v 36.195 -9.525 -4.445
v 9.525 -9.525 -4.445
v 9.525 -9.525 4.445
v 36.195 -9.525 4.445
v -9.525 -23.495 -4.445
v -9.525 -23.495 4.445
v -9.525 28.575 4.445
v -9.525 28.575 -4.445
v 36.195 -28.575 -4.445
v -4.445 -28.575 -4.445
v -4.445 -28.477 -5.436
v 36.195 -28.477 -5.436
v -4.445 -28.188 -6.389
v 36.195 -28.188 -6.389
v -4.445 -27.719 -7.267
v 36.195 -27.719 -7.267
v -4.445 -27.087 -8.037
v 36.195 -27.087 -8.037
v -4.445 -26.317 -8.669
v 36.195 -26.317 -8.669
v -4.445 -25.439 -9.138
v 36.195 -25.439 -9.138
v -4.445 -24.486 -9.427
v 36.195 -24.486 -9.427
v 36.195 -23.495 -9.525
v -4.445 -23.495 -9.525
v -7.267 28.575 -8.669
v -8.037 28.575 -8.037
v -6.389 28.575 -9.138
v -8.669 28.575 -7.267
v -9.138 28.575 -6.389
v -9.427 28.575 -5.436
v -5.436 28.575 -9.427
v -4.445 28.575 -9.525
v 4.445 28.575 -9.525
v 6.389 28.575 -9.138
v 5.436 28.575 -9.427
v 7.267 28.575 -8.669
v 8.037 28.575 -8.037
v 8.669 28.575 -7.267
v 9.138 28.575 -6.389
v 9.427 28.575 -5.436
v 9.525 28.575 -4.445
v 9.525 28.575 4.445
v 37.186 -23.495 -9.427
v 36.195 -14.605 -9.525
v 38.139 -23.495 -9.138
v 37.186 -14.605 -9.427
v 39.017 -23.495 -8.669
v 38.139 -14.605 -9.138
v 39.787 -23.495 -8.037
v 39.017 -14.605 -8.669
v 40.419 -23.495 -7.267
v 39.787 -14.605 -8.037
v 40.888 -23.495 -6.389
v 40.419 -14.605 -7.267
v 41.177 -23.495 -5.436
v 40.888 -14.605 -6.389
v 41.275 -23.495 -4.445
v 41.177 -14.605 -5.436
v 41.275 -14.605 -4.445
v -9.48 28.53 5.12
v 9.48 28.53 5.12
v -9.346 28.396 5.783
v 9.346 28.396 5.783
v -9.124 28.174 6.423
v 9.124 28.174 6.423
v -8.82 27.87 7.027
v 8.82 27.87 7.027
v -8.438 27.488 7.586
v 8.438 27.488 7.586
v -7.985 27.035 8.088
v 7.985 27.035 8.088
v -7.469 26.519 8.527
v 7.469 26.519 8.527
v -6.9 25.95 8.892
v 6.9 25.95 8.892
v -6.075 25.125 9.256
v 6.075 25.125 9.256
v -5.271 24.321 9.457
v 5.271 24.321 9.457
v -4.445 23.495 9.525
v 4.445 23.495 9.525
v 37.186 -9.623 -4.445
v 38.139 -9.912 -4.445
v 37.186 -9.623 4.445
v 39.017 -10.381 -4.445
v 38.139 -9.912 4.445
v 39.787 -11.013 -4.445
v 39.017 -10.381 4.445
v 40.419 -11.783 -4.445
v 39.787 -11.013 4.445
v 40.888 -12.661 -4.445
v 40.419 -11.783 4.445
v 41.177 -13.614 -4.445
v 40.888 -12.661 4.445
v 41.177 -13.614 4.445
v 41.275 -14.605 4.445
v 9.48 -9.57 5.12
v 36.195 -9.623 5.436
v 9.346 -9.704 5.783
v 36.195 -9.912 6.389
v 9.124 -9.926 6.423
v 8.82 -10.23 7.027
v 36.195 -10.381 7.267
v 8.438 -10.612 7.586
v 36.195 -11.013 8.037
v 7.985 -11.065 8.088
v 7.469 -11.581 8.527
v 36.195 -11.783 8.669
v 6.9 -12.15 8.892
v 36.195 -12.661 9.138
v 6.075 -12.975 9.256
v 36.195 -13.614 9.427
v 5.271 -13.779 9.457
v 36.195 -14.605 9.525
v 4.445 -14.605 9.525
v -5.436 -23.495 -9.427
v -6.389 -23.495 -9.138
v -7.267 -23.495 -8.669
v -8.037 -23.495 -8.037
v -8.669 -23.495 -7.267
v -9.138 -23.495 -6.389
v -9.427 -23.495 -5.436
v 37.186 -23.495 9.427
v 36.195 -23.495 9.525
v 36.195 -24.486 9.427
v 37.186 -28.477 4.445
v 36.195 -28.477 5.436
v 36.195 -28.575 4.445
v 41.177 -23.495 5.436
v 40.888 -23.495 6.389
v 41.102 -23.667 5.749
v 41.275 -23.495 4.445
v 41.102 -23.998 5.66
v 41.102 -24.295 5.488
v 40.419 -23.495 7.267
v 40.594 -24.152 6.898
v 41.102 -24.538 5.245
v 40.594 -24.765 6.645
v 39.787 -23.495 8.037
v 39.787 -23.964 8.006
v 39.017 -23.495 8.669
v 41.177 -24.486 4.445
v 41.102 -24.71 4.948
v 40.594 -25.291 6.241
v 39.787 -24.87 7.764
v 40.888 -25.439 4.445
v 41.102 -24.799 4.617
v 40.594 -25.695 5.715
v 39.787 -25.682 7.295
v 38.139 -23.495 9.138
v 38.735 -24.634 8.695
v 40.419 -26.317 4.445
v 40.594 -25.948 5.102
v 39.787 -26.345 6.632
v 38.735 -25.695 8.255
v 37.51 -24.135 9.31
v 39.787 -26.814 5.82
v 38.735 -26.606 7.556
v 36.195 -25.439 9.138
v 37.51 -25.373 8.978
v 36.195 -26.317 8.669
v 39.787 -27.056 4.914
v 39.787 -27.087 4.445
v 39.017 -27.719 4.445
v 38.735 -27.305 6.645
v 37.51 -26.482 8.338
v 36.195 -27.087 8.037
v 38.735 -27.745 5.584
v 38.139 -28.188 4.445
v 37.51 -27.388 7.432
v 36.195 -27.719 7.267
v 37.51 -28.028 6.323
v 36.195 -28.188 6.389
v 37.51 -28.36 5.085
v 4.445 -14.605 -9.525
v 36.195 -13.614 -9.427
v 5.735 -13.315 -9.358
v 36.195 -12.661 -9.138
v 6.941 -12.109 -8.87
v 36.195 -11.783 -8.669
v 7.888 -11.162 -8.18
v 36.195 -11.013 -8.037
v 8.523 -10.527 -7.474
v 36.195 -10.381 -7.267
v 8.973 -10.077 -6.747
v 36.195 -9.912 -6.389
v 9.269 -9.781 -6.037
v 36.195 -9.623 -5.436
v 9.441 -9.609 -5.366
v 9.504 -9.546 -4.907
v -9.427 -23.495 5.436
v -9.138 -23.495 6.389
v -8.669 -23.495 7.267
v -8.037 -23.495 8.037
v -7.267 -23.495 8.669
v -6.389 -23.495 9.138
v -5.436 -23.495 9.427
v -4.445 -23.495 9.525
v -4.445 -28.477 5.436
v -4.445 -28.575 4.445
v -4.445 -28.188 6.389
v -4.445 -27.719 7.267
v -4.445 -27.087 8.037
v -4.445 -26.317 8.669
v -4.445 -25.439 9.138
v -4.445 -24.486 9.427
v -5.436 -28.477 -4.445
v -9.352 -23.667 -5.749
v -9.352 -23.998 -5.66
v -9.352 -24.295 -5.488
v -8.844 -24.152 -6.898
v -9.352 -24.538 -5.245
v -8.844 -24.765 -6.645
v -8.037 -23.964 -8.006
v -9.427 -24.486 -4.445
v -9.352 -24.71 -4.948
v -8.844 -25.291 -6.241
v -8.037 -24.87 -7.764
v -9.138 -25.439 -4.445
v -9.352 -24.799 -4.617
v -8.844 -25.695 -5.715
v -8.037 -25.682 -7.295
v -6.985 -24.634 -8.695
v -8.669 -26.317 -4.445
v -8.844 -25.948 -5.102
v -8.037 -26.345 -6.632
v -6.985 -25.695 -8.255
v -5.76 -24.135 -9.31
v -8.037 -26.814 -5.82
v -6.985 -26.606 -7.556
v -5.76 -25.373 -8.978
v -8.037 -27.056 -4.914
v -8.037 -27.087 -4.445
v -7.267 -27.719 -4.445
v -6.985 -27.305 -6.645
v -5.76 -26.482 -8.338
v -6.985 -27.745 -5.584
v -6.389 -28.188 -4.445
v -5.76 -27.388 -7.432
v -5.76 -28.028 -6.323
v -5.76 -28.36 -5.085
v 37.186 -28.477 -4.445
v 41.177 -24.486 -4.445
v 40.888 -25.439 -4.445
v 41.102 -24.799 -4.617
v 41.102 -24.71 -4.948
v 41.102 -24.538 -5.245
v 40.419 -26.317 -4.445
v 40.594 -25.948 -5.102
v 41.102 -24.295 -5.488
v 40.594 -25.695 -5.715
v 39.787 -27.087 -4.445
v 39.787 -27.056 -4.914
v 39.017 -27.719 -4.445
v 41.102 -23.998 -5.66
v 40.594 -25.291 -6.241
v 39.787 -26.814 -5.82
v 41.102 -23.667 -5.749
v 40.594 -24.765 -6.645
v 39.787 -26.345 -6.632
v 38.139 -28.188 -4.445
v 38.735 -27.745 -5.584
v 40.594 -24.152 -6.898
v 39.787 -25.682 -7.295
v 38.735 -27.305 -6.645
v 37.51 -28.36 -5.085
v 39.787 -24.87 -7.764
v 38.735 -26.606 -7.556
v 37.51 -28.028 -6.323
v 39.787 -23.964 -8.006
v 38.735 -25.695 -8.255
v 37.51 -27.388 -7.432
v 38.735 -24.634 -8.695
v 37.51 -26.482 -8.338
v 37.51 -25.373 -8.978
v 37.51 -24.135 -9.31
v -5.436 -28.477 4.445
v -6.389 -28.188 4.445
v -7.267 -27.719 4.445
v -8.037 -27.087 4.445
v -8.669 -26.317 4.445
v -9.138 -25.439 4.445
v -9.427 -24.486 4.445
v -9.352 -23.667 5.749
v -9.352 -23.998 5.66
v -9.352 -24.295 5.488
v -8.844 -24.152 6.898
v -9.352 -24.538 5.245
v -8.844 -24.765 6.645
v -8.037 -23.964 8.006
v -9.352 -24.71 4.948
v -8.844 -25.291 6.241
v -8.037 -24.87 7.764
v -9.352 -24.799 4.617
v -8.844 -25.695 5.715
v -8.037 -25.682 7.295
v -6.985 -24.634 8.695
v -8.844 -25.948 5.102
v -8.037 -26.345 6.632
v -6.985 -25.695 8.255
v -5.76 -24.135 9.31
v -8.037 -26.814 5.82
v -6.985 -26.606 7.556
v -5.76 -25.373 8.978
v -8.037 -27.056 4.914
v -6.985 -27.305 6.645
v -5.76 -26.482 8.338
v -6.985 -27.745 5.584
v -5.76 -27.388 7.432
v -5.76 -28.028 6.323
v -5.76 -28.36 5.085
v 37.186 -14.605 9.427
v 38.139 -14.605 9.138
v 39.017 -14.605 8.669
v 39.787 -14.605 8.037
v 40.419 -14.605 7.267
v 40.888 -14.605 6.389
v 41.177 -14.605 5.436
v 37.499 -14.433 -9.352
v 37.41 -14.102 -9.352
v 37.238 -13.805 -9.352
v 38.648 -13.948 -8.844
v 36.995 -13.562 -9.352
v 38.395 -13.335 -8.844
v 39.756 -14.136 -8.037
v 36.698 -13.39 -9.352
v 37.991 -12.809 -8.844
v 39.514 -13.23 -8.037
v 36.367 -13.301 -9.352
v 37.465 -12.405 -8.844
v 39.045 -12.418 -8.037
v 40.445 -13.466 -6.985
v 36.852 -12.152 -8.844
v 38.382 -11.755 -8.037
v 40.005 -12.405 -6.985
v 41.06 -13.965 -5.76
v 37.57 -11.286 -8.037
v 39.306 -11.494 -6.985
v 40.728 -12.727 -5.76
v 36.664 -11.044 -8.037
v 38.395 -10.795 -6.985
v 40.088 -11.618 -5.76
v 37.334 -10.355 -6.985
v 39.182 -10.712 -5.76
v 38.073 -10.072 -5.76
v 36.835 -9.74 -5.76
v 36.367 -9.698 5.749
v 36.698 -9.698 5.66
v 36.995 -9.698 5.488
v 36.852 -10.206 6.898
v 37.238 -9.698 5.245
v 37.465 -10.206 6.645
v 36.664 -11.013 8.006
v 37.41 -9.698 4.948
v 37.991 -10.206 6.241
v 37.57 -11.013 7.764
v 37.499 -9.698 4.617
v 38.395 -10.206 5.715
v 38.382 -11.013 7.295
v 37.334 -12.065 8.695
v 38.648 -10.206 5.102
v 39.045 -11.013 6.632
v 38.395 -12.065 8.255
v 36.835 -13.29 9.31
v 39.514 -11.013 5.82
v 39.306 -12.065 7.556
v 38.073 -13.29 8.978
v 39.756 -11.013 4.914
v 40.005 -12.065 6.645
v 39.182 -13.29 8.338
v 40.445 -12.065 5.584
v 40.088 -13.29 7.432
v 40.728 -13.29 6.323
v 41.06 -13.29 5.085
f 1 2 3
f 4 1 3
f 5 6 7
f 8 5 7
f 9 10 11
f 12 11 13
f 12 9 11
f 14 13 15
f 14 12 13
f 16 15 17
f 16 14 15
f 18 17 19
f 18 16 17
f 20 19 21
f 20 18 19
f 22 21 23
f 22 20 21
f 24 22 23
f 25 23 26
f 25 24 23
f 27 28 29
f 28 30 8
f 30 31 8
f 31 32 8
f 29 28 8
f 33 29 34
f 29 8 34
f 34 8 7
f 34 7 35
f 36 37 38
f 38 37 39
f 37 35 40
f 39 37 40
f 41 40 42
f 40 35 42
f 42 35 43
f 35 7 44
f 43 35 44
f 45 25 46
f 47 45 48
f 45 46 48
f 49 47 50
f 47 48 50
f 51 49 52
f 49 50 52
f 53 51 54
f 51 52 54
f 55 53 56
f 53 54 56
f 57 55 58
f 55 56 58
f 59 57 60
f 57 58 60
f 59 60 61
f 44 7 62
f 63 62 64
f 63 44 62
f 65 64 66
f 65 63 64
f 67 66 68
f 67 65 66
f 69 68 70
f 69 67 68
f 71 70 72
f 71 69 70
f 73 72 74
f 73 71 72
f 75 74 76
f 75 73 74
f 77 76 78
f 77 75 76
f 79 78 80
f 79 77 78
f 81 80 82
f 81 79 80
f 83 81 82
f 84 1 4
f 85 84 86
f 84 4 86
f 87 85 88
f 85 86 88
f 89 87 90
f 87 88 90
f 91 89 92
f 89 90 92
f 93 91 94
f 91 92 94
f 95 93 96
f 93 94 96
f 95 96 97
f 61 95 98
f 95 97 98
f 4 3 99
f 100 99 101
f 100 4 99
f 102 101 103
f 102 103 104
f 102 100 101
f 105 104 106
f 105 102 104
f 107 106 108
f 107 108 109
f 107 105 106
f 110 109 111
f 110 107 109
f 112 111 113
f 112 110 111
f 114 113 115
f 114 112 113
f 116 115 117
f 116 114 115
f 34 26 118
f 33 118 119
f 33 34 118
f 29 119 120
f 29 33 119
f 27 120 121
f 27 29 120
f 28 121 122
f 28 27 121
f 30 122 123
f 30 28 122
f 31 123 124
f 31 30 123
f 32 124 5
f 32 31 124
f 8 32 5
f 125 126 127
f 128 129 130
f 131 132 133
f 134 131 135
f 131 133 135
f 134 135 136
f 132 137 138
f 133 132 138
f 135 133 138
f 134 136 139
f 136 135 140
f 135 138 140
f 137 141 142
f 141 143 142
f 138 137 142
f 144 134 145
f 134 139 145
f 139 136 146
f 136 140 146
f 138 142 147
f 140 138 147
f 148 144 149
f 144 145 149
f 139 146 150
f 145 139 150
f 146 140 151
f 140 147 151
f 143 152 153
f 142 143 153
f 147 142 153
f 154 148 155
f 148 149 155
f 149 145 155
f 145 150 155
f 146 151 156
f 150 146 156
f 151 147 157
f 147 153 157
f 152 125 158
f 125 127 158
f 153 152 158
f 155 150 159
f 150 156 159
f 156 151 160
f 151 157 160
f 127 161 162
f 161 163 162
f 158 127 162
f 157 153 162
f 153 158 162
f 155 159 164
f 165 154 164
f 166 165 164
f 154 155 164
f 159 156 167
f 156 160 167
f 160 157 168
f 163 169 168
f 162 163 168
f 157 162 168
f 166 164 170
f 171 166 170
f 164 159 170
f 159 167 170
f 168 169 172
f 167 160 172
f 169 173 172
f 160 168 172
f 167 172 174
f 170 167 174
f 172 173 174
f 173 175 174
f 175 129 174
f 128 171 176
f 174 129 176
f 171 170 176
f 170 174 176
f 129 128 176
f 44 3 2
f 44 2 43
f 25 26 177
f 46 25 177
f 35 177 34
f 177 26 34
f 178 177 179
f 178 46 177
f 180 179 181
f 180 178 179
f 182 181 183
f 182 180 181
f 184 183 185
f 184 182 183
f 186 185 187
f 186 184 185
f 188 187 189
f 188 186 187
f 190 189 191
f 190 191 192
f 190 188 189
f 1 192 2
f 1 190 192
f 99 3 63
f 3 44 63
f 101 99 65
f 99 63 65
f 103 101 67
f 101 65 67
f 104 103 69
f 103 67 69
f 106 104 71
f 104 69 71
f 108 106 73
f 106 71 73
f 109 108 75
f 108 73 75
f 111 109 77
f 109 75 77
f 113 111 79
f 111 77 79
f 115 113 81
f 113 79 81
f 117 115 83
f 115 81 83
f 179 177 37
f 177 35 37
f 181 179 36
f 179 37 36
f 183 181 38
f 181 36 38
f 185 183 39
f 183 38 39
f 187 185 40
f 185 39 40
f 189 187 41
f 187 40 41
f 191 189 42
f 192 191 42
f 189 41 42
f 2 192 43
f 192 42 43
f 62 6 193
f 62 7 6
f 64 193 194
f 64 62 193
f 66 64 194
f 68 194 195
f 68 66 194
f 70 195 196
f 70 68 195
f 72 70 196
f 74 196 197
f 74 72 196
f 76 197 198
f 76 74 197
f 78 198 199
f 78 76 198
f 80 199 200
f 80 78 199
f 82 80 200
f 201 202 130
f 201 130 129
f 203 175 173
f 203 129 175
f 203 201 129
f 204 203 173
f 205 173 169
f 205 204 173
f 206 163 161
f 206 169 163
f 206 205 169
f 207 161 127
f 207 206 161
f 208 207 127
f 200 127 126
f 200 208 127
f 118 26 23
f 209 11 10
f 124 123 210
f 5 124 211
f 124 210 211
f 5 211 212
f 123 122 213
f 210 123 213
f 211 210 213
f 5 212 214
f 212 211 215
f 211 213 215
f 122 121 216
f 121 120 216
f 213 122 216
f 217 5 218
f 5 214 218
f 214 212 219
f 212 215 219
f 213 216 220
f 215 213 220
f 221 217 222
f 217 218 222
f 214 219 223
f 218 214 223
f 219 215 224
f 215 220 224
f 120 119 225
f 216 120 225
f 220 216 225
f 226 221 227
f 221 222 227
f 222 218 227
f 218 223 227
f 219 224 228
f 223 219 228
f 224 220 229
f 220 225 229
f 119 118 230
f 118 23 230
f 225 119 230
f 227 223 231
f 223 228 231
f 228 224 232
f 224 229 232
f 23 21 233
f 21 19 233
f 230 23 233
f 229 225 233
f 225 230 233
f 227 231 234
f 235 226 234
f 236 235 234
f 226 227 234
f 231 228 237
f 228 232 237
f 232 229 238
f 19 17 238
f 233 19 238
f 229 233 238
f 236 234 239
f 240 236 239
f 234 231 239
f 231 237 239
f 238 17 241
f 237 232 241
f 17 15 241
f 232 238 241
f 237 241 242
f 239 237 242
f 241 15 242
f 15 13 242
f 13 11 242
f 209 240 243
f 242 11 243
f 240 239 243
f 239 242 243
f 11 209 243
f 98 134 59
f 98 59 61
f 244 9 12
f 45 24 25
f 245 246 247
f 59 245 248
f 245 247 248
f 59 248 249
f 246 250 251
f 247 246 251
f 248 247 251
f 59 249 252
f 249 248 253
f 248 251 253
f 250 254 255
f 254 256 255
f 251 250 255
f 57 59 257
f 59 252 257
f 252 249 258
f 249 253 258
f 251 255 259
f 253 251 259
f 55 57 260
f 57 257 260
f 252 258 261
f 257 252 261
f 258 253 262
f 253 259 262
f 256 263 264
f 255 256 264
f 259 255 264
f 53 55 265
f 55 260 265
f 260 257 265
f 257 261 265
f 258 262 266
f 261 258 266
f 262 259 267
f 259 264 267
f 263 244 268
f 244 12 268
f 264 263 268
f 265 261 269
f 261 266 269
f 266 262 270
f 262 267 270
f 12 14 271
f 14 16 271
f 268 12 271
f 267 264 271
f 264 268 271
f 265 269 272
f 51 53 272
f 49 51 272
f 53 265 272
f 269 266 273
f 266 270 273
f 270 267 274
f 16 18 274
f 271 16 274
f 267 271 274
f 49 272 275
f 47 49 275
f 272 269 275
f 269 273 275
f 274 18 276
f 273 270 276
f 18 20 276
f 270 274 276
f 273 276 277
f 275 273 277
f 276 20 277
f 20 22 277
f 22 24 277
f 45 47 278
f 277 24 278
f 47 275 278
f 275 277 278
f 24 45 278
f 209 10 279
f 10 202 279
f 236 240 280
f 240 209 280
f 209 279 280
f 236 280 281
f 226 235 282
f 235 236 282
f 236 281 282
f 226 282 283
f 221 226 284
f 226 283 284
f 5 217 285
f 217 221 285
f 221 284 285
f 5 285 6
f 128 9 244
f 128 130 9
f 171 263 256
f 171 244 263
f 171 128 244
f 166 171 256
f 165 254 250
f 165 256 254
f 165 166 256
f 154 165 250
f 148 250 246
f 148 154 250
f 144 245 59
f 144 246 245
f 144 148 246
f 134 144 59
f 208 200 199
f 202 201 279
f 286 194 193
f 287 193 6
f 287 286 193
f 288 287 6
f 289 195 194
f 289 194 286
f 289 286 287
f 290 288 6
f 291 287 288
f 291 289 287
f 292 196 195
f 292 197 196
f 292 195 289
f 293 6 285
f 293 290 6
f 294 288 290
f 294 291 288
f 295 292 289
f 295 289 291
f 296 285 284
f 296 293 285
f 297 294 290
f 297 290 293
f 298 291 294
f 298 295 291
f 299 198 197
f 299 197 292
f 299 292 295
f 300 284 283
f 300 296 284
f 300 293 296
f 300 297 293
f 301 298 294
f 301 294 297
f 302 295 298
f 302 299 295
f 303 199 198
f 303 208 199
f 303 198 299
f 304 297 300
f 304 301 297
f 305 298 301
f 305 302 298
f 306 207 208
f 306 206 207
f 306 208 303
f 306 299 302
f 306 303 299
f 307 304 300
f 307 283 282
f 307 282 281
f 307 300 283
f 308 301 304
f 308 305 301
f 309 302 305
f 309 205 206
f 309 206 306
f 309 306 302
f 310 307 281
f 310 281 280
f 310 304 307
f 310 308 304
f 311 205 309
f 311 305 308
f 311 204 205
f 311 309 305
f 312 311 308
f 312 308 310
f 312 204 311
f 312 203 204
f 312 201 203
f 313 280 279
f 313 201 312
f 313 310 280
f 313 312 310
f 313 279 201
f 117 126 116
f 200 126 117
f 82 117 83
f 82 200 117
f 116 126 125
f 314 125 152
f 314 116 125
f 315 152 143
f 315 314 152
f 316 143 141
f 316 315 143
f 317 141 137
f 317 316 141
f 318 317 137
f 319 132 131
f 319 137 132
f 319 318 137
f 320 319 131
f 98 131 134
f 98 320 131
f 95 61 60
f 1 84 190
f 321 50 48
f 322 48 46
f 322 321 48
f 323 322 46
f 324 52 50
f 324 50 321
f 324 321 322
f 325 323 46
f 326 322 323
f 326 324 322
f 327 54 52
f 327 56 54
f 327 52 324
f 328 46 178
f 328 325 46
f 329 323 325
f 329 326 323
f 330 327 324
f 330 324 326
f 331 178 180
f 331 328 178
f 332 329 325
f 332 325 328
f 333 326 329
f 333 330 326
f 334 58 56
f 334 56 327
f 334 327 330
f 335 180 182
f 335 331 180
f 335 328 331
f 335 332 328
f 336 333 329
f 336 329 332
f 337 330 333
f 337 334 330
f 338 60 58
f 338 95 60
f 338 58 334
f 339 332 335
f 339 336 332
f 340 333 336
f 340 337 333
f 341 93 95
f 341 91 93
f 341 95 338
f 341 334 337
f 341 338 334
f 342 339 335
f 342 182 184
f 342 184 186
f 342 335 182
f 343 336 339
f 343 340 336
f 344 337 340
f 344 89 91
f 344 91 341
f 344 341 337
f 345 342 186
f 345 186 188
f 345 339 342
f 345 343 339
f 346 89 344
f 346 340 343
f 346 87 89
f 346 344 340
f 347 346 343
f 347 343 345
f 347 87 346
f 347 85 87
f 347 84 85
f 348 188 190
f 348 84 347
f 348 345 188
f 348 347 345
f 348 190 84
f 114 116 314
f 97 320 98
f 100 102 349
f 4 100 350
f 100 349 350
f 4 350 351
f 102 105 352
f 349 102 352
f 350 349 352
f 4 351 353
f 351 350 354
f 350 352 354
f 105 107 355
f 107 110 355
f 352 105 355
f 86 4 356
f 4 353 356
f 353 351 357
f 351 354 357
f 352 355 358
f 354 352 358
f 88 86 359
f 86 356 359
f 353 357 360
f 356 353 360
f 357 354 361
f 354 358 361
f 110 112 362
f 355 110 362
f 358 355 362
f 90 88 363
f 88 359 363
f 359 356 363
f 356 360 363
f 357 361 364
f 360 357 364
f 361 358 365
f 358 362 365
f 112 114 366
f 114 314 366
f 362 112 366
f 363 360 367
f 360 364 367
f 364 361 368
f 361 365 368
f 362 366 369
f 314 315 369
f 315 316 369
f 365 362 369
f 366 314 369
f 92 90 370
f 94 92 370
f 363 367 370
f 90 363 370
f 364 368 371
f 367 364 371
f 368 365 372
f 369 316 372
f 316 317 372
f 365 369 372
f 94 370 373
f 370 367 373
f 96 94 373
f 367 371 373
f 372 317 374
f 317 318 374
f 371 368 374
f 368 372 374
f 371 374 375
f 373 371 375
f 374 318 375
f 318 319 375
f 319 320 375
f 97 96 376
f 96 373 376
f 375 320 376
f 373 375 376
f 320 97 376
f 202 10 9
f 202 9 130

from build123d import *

# Parameters (mm, degrees)
F0_W     = 19.05
F0_H     = 57.15
F1_DEPTH = 9.525
F2_W     = 19.05
F2_H     = 19.05
F3_DEPTH = 31.75
F4_R     = 5.08


with BuildPart() as f1:
    # F0 (on Top) → F1 (new body, symmetric)
    with BuildSketch(Plane.XY):
        Rectangle(F0_W, F0_H)
    extrude(amount=F1_DEPTH, both=True)

    # F2 (on face) → F3 (join)
    with BuildSketch(Plane.YZ.offset(9.525)):
        with Locations((-19.05, 0)):
            Rectangle(F2_W, F2_H)
    extrude(amount=F3_DEPTH)

    # F4
    f4_edges = [f1.edges().sort_by_distance(p)[0] for p in [
        (9.525, 9.525, 9.525),
        (15.875, -28.575, 9.525),
        (41.275, -19.05, 9.525),
        (25.4, -9.525, 9.525),
        (0, 28.575, 9.525),
        (-9.525, 0, 9.525),
        (15.875, -28.575, -9.525),
        (41.275, -28.575, 0),
        (41.275, -9.525, 0),
        (41.275, -19.05, -9.525),
        (-9.525, 0, -9.525),
        (-9.525, -28.575, 0),
        (9.525, 9.525, -9.525),
        (25.4, -9.525, -9.525),
    ]]
    fillet(f4_edges, radius=F4_R)


solid = f1.part
